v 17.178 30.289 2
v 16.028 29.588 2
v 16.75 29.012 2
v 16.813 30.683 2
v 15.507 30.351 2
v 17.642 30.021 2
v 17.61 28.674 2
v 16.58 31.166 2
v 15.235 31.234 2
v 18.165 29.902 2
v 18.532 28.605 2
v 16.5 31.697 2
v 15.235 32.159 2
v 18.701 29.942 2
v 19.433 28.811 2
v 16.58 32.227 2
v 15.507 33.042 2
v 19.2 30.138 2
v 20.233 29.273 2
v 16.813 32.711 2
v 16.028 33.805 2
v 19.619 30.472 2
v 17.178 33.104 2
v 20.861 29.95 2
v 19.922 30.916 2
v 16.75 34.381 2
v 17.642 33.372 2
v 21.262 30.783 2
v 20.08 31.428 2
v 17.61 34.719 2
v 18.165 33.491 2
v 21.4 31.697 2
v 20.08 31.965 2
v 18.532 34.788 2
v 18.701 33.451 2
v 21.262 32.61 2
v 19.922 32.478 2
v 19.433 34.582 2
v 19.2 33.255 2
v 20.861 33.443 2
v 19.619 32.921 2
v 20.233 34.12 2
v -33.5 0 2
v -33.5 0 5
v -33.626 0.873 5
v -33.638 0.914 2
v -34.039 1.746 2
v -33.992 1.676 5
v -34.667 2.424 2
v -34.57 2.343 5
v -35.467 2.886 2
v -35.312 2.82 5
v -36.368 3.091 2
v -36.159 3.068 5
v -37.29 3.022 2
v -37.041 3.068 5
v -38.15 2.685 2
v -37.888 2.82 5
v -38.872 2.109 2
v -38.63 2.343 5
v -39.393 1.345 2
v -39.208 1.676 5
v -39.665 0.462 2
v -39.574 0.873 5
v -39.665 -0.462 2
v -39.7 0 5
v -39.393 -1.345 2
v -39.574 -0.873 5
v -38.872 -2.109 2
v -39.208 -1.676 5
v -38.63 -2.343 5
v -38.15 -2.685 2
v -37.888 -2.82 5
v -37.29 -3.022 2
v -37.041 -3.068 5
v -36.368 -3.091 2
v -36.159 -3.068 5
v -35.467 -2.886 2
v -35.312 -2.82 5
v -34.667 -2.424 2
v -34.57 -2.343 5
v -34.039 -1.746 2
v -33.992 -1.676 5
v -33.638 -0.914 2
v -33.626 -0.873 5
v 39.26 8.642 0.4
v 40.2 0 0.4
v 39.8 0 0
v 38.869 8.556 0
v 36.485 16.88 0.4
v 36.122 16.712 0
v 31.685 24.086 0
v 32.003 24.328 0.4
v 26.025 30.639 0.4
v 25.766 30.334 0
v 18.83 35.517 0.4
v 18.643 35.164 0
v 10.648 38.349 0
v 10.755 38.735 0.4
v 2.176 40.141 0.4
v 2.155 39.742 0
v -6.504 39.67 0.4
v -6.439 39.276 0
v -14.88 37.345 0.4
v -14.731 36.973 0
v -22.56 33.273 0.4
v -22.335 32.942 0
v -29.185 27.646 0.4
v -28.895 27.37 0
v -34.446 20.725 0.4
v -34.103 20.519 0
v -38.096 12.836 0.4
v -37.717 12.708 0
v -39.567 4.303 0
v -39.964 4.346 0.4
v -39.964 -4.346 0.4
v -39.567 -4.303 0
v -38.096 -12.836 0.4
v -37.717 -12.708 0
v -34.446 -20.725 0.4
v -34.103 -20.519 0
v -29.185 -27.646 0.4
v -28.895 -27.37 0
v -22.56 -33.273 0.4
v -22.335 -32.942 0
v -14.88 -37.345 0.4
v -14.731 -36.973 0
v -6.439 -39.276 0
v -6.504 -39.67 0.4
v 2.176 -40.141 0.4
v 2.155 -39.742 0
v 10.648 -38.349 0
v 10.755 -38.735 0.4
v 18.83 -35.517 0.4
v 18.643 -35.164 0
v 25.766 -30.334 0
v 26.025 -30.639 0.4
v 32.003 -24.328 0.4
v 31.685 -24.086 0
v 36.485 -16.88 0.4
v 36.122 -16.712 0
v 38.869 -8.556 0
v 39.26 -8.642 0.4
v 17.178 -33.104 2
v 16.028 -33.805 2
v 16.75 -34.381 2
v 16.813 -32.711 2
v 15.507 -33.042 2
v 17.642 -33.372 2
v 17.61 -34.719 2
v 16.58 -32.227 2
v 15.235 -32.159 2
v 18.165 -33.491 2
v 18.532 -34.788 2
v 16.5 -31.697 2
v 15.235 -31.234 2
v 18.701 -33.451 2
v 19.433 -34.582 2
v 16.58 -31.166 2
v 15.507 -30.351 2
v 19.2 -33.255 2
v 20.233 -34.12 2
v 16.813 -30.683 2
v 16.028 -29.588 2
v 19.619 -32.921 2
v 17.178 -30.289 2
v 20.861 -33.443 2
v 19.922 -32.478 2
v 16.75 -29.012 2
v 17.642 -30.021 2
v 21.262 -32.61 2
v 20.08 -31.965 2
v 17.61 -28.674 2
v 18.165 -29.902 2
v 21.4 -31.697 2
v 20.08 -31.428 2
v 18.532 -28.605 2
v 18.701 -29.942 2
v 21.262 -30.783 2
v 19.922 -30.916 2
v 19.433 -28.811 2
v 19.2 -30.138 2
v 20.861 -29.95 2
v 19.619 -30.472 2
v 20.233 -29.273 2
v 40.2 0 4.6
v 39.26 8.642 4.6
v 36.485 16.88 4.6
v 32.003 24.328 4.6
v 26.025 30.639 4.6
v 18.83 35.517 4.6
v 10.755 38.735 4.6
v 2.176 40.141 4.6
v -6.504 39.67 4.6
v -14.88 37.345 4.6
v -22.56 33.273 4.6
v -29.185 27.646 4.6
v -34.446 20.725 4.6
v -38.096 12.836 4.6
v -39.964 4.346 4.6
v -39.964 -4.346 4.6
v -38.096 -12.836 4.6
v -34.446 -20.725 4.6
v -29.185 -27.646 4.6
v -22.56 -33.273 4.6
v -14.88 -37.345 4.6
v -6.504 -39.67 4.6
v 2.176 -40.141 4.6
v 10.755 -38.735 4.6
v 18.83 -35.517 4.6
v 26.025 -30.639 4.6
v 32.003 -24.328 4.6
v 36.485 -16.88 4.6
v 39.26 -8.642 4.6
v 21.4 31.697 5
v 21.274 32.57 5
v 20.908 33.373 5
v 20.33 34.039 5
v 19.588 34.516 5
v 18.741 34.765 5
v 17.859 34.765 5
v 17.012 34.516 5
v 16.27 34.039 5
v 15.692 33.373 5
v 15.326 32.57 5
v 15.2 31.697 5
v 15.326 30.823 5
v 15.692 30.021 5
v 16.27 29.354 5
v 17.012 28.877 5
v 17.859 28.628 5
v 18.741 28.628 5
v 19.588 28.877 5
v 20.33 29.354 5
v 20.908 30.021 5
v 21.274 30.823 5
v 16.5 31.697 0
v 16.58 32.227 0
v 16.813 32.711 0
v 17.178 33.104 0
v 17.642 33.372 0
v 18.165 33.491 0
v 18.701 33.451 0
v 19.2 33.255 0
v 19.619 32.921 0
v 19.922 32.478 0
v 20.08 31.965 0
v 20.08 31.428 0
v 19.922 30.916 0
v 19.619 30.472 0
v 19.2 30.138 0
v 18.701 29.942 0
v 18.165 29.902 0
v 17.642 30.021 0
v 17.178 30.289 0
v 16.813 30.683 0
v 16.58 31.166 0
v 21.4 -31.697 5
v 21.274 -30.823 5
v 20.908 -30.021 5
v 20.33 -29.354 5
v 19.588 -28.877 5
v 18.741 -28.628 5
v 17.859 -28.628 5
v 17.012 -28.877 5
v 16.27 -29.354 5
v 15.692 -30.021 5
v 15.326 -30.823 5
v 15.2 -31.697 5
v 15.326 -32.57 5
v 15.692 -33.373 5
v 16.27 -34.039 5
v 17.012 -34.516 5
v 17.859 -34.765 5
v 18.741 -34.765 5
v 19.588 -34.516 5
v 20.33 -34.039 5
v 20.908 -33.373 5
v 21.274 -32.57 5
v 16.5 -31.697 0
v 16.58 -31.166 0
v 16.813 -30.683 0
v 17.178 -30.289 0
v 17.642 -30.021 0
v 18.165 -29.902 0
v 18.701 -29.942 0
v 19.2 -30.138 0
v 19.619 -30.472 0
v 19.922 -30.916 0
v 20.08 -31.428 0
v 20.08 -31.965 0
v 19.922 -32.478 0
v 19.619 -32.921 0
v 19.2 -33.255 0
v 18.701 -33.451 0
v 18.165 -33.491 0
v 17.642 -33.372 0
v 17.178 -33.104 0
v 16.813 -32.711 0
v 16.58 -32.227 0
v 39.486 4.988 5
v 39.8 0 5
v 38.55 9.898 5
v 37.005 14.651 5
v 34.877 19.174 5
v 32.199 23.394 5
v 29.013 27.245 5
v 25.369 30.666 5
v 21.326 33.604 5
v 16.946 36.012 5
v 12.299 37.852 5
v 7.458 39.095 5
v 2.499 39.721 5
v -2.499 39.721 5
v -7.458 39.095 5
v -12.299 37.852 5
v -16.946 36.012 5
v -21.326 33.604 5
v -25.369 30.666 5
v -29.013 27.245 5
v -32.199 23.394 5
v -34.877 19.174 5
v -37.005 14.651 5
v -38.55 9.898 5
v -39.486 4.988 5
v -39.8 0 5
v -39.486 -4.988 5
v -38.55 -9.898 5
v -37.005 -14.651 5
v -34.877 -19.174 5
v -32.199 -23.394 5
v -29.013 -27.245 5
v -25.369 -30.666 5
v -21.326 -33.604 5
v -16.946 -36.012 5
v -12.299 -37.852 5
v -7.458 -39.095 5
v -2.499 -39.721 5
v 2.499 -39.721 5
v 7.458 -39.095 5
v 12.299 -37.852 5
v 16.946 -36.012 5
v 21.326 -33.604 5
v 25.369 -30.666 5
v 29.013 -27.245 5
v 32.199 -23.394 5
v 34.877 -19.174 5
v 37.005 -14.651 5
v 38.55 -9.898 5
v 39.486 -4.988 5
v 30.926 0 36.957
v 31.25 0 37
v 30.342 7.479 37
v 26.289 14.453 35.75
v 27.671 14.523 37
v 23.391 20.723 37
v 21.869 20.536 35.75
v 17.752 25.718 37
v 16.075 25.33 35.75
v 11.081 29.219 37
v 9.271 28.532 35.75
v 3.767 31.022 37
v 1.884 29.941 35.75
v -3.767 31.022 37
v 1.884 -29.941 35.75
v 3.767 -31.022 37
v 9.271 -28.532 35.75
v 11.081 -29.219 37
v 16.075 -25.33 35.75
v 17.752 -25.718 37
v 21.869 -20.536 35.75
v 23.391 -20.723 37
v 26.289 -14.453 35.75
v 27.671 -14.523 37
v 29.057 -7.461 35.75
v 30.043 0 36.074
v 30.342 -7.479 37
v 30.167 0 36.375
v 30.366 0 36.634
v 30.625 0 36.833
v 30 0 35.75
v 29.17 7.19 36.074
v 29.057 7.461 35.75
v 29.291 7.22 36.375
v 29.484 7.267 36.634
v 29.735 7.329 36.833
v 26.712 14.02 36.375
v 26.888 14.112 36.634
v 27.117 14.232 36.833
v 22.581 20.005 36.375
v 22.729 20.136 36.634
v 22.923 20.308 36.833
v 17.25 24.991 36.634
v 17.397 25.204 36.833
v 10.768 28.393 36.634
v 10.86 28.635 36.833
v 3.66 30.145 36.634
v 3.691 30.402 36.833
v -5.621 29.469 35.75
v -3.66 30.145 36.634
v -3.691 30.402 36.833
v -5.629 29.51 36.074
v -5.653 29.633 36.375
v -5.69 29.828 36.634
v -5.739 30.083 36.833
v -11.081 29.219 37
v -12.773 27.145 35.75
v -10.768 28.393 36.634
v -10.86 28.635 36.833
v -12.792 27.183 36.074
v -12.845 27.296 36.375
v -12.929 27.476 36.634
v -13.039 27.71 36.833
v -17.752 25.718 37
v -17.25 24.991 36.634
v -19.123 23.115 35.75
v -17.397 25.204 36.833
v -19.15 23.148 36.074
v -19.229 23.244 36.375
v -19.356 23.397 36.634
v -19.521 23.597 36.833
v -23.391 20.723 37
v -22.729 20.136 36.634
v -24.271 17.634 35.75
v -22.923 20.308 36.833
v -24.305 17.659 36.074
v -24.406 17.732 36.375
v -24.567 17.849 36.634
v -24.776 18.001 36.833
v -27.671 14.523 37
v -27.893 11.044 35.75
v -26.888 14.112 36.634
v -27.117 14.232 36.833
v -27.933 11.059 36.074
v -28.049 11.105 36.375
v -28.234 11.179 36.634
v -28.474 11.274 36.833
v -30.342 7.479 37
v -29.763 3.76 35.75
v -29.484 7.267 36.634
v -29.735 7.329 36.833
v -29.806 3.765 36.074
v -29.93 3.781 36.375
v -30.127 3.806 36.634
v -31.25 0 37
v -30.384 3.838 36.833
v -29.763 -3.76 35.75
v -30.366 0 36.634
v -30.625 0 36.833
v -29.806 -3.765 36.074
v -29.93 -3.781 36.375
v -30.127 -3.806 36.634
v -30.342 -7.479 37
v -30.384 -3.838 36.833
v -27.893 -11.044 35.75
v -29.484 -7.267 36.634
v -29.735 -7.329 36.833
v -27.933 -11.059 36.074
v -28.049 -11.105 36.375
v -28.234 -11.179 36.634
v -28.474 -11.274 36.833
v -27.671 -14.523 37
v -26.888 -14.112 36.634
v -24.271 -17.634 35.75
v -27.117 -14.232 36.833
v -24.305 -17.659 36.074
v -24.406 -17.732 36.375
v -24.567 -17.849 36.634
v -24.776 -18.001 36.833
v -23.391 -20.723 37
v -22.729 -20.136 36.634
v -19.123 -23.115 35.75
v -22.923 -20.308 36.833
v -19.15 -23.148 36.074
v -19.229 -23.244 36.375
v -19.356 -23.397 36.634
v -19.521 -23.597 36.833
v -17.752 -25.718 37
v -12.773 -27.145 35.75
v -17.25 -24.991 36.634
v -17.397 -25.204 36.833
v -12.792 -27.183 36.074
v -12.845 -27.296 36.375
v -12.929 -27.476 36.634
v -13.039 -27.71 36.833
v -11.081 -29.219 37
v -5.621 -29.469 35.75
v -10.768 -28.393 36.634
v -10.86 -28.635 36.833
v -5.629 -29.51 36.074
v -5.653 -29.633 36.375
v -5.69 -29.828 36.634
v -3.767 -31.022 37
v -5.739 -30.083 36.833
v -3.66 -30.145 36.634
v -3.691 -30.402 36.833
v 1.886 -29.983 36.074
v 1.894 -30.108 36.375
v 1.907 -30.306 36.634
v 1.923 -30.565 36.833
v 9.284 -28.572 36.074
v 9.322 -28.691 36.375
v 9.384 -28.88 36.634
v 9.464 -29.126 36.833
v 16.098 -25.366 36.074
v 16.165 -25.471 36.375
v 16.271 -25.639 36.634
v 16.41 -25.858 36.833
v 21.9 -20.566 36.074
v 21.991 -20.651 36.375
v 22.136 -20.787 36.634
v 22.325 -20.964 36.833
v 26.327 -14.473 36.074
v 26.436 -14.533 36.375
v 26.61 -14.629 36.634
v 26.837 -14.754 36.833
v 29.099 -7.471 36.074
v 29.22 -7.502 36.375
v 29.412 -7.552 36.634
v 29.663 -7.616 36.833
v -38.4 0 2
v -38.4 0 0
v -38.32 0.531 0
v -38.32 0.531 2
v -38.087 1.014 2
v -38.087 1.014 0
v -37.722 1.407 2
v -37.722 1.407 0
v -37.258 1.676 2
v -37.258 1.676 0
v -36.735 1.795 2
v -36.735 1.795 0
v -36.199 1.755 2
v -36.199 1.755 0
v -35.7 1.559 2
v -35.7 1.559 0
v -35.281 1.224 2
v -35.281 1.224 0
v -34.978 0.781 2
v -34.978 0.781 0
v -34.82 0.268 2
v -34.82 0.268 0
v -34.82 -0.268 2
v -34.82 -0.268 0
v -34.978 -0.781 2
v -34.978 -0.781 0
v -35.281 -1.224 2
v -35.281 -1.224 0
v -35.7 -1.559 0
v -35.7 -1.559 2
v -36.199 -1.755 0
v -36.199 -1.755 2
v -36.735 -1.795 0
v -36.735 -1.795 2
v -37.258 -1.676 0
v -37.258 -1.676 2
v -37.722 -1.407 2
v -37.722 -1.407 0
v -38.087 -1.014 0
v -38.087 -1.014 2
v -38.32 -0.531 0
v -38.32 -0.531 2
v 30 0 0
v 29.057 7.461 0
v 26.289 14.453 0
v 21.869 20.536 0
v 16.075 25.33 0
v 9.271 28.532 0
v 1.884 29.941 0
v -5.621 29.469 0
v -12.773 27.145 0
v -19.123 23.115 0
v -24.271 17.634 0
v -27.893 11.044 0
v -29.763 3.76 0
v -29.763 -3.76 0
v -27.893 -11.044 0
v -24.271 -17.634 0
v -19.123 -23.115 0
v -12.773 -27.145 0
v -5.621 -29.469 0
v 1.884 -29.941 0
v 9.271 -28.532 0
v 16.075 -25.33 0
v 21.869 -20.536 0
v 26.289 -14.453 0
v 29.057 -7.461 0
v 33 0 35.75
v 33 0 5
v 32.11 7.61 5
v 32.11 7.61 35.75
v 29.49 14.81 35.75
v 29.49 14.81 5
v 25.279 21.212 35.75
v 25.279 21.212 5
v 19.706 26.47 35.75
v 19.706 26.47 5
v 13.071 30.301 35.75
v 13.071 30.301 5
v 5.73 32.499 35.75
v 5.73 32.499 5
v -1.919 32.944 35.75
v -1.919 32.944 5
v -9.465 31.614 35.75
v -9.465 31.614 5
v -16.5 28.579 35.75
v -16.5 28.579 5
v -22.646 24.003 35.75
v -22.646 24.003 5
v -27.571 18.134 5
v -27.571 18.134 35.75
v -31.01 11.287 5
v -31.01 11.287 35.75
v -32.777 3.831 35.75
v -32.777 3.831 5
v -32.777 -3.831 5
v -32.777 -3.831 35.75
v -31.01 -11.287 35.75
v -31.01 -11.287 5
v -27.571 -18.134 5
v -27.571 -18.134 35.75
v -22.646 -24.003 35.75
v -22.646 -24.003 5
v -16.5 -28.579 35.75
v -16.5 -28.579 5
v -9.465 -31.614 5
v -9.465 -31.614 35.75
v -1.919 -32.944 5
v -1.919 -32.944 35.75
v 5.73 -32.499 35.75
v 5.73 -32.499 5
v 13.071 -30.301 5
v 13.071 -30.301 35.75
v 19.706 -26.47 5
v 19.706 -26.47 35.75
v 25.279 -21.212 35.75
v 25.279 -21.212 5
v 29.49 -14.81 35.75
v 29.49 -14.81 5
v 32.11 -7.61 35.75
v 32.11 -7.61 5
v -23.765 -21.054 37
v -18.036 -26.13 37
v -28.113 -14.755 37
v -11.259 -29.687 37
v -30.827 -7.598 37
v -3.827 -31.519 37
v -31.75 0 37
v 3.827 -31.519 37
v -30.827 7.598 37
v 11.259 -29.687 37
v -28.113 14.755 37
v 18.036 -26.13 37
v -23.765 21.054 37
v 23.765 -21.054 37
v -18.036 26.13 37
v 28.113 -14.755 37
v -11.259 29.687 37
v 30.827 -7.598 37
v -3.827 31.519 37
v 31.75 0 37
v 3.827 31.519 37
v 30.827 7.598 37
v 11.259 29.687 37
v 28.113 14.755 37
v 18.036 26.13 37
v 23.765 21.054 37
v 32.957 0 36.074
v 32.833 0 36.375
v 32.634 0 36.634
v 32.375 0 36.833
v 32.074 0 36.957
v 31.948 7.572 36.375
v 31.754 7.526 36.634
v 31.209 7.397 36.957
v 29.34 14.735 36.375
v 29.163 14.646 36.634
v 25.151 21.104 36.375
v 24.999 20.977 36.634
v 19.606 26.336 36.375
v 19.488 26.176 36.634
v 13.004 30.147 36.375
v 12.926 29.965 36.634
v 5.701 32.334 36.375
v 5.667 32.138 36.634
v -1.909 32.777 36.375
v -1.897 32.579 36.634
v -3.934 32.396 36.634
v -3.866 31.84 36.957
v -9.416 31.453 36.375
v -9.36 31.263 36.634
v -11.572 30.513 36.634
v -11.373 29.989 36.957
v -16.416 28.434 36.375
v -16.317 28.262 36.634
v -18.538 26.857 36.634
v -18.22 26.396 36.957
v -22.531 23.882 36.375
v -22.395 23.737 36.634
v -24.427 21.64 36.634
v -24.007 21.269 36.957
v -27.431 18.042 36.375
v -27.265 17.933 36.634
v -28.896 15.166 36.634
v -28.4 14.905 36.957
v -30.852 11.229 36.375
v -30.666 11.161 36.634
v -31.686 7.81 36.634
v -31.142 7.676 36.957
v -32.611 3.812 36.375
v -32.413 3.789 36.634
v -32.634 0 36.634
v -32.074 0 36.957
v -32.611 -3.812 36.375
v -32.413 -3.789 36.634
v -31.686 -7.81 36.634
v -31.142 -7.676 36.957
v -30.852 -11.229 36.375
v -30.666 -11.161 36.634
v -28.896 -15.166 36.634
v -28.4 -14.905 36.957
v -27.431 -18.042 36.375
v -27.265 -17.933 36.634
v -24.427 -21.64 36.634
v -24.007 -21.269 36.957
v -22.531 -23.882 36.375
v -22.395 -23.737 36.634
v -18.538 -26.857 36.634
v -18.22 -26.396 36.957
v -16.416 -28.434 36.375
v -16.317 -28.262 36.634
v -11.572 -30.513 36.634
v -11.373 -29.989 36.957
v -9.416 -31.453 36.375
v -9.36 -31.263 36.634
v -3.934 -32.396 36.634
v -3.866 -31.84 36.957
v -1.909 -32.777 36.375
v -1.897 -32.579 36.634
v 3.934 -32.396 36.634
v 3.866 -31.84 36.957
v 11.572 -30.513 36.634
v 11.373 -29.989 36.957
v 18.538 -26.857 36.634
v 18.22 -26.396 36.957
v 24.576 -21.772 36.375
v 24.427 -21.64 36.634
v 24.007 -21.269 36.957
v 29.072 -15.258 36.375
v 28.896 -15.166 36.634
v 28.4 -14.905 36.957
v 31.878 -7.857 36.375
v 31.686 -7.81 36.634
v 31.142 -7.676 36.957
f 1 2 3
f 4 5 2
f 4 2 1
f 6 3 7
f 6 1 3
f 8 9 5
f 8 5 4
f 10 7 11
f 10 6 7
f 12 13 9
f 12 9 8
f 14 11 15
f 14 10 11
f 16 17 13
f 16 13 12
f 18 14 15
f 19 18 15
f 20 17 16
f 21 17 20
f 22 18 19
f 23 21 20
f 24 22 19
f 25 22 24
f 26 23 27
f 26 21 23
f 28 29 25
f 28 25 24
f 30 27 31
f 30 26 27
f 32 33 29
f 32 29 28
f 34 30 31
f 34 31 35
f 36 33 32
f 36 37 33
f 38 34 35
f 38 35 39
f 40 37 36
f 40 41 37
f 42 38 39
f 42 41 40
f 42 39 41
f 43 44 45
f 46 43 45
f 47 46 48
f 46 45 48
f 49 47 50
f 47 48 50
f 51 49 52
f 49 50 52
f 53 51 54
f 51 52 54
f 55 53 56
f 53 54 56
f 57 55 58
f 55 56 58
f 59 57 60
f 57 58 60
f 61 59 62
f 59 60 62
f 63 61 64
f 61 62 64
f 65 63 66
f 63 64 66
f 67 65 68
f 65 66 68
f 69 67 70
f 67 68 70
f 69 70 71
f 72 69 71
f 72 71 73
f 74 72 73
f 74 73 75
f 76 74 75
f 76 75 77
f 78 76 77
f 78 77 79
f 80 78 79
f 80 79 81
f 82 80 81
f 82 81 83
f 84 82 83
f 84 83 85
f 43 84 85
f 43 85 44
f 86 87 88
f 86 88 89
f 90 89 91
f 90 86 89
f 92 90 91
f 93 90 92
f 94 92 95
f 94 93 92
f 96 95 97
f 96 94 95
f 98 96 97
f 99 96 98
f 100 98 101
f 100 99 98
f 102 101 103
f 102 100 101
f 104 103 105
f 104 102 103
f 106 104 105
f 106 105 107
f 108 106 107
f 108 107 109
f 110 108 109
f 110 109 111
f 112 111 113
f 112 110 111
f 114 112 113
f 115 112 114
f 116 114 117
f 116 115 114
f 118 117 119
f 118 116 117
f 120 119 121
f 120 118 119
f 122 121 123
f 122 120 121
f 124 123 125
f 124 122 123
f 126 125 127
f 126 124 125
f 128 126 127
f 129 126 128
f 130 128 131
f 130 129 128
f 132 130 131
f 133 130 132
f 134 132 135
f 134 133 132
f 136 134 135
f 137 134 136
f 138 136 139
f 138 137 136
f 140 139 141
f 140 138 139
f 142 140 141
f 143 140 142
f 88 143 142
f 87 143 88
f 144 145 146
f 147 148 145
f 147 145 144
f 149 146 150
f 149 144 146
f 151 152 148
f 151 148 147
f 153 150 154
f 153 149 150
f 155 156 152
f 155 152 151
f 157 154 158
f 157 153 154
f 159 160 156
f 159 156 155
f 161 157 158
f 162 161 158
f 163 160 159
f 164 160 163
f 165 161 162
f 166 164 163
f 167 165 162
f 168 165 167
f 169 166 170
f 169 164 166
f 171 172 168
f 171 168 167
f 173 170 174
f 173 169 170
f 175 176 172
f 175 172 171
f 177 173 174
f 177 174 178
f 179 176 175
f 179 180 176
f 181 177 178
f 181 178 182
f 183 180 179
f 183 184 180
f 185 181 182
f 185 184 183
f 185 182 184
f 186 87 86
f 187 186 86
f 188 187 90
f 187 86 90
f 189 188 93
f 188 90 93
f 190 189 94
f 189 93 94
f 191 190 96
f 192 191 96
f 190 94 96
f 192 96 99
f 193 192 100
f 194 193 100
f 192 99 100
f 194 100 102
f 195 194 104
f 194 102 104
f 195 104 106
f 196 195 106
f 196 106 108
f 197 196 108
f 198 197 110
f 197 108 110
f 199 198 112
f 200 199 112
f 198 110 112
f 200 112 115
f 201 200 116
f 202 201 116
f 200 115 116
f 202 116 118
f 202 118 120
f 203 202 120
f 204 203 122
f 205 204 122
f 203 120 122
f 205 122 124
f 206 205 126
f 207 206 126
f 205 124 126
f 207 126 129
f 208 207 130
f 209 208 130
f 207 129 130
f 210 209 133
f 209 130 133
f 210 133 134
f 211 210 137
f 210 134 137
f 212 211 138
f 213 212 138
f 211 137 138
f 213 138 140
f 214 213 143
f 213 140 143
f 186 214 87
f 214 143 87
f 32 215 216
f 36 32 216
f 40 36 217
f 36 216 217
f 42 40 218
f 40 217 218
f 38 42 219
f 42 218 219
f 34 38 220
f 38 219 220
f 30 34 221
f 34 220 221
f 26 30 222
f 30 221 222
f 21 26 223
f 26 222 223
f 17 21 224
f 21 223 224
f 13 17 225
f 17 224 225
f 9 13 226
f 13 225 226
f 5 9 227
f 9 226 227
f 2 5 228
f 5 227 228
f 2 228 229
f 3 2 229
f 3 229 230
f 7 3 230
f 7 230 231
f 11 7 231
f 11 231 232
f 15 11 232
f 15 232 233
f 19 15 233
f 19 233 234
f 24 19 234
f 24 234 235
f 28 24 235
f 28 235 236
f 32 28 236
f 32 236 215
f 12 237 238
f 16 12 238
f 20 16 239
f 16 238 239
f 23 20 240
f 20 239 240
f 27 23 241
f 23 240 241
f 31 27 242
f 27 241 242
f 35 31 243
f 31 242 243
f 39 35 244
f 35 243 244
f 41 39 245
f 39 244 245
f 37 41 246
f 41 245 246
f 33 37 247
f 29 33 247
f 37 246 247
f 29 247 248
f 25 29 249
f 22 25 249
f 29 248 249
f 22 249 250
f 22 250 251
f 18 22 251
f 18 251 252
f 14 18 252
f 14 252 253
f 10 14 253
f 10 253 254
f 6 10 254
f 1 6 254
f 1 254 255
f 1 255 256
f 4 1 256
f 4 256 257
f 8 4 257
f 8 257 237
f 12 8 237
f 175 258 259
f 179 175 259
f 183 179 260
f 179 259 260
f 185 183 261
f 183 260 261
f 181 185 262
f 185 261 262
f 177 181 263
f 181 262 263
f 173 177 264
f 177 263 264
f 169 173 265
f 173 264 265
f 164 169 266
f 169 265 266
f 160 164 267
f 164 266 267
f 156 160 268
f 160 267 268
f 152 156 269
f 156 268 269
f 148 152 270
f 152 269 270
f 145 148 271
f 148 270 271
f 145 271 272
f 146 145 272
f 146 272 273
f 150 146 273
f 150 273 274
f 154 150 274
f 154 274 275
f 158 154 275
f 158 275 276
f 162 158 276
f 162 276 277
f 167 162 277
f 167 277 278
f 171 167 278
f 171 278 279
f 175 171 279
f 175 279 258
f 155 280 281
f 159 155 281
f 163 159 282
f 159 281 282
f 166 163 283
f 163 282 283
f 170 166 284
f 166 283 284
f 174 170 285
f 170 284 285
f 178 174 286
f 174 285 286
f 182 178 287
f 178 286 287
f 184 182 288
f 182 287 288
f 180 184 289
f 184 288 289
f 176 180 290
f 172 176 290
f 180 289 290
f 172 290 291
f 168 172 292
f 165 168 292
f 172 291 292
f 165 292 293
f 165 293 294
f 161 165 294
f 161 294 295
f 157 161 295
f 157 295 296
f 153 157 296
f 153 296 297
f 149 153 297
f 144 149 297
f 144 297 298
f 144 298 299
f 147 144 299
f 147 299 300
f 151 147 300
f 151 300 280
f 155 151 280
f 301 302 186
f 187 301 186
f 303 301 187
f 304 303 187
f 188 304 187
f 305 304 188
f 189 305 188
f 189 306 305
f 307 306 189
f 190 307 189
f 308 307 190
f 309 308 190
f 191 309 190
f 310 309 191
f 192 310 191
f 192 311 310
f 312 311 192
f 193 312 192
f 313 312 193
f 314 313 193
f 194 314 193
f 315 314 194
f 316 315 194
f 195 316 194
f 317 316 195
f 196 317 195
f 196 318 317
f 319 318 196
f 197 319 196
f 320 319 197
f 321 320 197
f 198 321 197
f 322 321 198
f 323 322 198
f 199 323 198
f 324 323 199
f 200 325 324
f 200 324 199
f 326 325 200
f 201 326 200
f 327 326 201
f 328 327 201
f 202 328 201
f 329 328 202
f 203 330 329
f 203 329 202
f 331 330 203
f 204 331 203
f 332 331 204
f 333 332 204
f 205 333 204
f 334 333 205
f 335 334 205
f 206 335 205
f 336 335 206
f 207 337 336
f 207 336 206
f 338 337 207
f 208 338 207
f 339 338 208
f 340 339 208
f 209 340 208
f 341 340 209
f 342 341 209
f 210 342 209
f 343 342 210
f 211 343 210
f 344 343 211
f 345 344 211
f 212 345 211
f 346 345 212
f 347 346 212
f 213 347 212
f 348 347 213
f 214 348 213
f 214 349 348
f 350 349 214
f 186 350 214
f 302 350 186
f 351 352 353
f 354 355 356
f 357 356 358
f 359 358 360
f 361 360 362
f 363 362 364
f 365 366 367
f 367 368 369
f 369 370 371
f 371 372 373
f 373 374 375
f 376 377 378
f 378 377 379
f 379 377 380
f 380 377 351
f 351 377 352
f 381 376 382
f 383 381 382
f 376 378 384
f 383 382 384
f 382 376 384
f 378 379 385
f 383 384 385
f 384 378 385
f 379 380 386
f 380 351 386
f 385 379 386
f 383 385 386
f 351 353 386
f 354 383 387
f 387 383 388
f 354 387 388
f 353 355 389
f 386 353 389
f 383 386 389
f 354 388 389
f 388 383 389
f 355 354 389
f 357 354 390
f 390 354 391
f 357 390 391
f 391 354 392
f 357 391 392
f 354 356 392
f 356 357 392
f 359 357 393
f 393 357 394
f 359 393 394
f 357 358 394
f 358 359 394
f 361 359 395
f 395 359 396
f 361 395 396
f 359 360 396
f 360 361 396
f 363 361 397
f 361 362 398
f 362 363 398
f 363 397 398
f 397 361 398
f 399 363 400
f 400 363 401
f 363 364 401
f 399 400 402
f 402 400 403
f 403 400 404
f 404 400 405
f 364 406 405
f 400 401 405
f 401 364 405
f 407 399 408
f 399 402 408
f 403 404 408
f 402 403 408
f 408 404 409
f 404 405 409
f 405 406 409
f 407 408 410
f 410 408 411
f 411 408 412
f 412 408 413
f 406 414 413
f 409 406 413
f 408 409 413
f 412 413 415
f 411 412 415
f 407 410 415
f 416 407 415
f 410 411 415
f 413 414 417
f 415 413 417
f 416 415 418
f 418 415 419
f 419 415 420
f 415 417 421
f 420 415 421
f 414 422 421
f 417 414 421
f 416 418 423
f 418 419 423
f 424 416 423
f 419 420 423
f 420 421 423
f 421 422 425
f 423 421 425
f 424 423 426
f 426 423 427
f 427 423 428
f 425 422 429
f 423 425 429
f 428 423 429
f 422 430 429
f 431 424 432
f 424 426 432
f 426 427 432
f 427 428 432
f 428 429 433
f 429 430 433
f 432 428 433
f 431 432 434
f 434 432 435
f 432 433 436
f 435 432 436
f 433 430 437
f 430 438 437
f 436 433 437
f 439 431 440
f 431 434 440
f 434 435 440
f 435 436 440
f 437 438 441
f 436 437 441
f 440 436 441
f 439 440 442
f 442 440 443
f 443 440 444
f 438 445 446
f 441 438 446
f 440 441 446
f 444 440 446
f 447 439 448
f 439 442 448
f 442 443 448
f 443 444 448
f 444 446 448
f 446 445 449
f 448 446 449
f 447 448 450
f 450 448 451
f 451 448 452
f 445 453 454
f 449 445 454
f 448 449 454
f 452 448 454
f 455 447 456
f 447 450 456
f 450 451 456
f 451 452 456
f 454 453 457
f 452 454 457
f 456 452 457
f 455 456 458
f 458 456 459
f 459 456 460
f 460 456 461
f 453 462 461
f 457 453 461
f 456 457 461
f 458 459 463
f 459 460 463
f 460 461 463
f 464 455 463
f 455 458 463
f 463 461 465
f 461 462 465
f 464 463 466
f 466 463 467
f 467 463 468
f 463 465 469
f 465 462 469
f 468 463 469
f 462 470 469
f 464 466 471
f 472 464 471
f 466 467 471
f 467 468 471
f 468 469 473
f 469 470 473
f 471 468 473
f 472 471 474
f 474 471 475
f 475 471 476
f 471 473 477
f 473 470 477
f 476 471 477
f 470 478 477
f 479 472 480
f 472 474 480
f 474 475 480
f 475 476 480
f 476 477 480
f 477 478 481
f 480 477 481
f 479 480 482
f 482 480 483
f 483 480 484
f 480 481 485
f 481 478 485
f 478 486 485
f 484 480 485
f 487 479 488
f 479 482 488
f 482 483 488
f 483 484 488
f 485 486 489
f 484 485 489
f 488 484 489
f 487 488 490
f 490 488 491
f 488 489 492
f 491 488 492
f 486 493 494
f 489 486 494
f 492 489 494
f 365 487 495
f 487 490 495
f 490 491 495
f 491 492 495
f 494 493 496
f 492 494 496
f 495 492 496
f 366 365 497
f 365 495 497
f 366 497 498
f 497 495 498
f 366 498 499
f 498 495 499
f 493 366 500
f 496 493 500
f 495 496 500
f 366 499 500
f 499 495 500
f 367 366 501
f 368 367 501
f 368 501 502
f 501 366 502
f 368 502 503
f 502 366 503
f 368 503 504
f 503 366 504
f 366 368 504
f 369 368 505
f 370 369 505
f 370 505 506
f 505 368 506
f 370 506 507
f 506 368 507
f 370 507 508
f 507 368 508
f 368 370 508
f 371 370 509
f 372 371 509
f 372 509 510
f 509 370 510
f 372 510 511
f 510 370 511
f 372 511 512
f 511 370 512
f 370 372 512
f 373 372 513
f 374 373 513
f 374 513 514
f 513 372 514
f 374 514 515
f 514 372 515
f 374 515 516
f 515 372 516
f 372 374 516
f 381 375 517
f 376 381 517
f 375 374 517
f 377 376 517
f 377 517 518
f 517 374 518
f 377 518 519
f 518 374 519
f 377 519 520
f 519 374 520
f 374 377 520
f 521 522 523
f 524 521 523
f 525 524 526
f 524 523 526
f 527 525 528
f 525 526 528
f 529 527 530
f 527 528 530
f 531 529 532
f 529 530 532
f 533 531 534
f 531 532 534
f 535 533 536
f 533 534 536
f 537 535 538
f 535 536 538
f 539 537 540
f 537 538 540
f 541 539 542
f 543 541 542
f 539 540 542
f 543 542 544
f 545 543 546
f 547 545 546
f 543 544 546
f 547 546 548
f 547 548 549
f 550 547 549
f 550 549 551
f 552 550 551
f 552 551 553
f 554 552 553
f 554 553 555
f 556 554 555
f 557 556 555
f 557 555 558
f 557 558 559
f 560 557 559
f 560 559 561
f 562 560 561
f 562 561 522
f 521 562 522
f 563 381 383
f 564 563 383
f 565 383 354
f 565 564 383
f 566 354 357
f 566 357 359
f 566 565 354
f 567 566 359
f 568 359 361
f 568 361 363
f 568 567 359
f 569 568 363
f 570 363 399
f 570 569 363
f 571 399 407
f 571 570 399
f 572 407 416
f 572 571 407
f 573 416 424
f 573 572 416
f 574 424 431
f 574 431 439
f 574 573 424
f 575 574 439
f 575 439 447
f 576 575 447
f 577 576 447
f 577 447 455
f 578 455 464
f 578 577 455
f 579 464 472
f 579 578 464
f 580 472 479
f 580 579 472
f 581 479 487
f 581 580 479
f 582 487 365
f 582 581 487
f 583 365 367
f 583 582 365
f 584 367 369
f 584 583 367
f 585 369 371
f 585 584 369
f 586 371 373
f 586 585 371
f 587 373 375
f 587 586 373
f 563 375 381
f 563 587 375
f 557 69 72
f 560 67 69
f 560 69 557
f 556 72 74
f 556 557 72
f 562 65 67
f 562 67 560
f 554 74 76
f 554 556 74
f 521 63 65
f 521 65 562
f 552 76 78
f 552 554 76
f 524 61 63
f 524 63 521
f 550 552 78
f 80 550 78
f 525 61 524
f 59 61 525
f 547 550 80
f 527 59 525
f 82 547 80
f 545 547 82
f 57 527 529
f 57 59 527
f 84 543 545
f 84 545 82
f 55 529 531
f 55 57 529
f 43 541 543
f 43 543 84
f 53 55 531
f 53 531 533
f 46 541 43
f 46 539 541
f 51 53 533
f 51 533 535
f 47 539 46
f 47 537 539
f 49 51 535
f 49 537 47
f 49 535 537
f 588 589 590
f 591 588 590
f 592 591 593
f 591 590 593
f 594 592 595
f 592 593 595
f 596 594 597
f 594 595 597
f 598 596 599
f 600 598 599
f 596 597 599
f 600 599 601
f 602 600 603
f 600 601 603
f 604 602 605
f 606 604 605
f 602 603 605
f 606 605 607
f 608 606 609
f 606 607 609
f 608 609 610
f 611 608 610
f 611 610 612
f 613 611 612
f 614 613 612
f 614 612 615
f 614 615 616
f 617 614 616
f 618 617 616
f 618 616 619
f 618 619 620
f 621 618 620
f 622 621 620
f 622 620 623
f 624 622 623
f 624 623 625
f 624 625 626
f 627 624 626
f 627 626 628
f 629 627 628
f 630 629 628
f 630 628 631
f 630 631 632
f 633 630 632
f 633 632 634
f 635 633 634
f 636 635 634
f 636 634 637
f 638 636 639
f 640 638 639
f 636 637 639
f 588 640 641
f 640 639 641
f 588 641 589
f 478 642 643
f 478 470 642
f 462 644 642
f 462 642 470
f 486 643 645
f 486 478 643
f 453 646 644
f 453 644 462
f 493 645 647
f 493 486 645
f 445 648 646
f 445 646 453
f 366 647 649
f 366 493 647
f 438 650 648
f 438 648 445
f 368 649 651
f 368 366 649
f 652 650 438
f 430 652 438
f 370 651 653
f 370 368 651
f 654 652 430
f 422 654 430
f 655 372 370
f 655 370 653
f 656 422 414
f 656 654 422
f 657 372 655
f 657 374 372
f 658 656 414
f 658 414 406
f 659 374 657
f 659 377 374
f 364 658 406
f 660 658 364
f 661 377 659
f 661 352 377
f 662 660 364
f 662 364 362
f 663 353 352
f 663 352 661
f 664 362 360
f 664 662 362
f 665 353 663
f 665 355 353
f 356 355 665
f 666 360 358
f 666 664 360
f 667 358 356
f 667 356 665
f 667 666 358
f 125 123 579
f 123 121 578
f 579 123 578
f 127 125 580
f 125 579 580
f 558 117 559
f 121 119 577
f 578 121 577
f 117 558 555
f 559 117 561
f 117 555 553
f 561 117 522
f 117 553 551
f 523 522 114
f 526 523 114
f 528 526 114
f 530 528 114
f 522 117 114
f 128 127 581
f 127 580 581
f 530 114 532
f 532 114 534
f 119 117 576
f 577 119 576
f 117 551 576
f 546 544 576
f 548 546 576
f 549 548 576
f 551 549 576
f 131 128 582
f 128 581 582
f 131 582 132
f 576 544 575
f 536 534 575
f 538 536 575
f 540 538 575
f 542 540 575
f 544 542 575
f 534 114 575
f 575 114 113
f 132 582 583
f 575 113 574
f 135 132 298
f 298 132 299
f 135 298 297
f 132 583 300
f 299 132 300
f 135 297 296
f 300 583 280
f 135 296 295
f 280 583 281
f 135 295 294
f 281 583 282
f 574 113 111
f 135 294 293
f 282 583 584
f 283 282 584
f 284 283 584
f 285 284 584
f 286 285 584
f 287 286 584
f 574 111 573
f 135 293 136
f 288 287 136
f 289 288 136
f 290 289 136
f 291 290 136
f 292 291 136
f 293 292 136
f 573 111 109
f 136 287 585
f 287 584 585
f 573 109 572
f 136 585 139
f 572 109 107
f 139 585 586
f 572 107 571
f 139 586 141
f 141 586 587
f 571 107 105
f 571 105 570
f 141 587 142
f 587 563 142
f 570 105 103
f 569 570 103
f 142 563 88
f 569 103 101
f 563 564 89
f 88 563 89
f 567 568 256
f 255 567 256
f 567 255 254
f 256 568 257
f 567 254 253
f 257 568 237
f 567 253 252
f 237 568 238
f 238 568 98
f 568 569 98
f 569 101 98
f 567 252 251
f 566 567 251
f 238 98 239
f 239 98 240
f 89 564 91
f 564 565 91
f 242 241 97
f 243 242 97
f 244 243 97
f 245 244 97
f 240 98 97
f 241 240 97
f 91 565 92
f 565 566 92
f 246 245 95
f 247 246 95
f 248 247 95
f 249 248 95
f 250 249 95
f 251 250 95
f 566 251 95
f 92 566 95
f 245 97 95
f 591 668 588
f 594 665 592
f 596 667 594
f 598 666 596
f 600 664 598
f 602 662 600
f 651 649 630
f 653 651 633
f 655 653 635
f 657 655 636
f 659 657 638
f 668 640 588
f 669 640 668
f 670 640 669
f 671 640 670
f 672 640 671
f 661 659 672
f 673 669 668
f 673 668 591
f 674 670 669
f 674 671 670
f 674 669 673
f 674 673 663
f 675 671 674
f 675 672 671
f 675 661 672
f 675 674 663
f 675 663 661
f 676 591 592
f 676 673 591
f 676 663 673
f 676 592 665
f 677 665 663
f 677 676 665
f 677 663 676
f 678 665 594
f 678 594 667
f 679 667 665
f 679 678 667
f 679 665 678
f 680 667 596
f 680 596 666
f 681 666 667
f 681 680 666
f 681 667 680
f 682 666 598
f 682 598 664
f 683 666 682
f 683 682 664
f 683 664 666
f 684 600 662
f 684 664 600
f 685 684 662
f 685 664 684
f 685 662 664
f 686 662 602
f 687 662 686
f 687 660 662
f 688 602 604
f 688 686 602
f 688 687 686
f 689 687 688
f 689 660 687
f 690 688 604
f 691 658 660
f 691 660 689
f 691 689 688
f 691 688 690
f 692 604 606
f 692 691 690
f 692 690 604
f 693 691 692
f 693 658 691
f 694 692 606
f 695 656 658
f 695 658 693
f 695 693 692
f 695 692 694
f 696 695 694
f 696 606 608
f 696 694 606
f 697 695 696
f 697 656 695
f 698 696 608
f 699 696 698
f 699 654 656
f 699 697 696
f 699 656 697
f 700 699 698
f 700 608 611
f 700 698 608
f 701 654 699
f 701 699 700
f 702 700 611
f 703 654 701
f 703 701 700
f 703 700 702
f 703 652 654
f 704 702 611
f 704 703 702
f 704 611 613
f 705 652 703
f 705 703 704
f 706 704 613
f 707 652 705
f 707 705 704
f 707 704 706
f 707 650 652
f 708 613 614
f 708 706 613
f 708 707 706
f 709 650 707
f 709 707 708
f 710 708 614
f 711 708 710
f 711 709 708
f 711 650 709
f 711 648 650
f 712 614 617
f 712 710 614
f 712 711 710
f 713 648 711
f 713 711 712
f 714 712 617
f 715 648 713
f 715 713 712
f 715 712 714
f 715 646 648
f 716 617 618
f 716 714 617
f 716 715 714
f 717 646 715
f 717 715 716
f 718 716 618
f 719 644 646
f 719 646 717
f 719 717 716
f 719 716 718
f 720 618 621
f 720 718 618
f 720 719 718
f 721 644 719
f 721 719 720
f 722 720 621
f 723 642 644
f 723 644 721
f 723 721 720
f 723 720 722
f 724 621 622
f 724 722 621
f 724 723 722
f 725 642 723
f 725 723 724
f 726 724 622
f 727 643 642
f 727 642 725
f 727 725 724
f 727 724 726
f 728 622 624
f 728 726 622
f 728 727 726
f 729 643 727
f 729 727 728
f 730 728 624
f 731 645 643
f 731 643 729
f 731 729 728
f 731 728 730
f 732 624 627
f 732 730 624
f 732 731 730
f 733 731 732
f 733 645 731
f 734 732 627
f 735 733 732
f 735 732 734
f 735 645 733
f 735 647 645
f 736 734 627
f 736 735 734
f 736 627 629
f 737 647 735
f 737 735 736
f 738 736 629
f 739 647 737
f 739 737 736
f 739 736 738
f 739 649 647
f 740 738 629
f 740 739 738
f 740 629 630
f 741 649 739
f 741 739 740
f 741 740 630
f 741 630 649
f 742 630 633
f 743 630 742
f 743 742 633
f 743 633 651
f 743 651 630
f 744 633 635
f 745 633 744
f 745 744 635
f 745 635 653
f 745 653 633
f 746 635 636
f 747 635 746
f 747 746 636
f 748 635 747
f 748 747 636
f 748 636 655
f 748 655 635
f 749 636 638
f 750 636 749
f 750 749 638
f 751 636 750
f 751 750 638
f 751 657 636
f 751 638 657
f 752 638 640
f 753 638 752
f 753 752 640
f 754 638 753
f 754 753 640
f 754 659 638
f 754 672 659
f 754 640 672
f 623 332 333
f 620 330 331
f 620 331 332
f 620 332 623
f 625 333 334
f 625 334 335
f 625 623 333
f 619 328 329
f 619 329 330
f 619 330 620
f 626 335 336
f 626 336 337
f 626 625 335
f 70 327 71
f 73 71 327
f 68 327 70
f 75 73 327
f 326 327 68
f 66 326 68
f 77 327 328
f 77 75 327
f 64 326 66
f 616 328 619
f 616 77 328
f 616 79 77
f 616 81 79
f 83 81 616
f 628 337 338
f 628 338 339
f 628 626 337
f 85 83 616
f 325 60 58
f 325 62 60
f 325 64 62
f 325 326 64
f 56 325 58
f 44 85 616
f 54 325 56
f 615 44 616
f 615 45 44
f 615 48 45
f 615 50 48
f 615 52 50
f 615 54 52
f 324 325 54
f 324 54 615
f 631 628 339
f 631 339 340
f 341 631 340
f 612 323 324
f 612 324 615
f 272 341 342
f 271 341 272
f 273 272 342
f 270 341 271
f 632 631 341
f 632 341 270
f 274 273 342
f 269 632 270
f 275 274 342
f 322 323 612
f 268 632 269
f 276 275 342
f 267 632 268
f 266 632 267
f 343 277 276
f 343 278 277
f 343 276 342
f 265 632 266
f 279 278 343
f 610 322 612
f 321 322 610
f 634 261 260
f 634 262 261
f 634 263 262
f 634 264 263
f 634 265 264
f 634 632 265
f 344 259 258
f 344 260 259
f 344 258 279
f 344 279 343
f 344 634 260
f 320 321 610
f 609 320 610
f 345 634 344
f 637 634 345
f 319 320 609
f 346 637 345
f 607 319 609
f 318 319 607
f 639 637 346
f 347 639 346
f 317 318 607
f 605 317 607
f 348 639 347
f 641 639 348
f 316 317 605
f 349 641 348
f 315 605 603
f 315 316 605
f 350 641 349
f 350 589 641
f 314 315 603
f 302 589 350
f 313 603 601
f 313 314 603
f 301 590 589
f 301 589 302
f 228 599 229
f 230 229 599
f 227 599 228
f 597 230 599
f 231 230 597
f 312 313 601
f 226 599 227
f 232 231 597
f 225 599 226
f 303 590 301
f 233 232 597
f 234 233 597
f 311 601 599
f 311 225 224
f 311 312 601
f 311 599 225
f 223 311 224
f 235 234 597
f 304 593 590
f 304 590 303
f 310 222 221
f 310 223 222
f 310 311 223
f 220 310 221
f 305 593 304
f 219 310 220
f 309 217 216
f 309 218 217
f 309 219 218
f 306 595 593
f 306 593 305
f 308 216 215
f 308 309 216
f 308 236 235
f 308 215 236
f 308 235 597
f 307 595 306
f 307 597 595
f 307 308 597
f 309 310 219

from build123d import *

# Parameters (mm, degrees)
SKETCH_R         = 33
PAD_DEPTH        = 37
SKETCH001_R      = 40.2
PAD001_DEPTH     = 5
SKETCH002_R      = 30
POCKET_DEPTH     = 37
HOLE_D           = 3.6
HOLE_DEPTH       = 5
HOLE_CBORE_D     = 6.2
HOLE_CBORE_DEPTH = 3
FILLET001_R      = 1.25
CHAMFER_SIZE     = 0.4


with BuildPart() as part:
    # Sketch → Pad (new body)
    with BuildSketch(Plane.XY):
        Circle(SKETCH_R)
    extrude(amount=PAD_DEPTH)

    # Sketch001 → Pad001 (join)
    with BuildSketch(Plane.XY):
        Circle(SKETCH001_R)
    extrude(amount=PAD001_DEPTH)

    # Sketch002 → Pocket (cut)
    with BuildSketch(Plane.XY):
        Circle(SKETCH002_R)
    extrude(amount=POCKET_DEPTH, mode=Mode.SUBTRACT)

    # Hole
    with Locations(Plane.XY.offset(5)):
        with Locations((-36.6, 0), (18.3, 31.69653), (18.3, -31.69653)):
            CounterBoreHole(HOLE_D / 2, HOLE_CBORE_D / 2, HOLE_CBORE_DEPTH, depth=HOLE_DEPTH)

    # Fillet001
    fillet001_edges = [part.edges().sort_by_distance(p)[0] for p in [
        (-33, 0, 37),
        (-30, 0, 37),
    ]]
    fillet(fillet001_edges, radius=FILLET001_R)

    # Chamfer
    chamfer_edges = [part.edges().sort_by_distance(p)[0] for p in [
        (-40.2, 0, 5),
        (-40.2, 0, 0),
    ]]
    chamfer(chamfer_edges, length=CHAMFER_SIZE)


solid = part.part
